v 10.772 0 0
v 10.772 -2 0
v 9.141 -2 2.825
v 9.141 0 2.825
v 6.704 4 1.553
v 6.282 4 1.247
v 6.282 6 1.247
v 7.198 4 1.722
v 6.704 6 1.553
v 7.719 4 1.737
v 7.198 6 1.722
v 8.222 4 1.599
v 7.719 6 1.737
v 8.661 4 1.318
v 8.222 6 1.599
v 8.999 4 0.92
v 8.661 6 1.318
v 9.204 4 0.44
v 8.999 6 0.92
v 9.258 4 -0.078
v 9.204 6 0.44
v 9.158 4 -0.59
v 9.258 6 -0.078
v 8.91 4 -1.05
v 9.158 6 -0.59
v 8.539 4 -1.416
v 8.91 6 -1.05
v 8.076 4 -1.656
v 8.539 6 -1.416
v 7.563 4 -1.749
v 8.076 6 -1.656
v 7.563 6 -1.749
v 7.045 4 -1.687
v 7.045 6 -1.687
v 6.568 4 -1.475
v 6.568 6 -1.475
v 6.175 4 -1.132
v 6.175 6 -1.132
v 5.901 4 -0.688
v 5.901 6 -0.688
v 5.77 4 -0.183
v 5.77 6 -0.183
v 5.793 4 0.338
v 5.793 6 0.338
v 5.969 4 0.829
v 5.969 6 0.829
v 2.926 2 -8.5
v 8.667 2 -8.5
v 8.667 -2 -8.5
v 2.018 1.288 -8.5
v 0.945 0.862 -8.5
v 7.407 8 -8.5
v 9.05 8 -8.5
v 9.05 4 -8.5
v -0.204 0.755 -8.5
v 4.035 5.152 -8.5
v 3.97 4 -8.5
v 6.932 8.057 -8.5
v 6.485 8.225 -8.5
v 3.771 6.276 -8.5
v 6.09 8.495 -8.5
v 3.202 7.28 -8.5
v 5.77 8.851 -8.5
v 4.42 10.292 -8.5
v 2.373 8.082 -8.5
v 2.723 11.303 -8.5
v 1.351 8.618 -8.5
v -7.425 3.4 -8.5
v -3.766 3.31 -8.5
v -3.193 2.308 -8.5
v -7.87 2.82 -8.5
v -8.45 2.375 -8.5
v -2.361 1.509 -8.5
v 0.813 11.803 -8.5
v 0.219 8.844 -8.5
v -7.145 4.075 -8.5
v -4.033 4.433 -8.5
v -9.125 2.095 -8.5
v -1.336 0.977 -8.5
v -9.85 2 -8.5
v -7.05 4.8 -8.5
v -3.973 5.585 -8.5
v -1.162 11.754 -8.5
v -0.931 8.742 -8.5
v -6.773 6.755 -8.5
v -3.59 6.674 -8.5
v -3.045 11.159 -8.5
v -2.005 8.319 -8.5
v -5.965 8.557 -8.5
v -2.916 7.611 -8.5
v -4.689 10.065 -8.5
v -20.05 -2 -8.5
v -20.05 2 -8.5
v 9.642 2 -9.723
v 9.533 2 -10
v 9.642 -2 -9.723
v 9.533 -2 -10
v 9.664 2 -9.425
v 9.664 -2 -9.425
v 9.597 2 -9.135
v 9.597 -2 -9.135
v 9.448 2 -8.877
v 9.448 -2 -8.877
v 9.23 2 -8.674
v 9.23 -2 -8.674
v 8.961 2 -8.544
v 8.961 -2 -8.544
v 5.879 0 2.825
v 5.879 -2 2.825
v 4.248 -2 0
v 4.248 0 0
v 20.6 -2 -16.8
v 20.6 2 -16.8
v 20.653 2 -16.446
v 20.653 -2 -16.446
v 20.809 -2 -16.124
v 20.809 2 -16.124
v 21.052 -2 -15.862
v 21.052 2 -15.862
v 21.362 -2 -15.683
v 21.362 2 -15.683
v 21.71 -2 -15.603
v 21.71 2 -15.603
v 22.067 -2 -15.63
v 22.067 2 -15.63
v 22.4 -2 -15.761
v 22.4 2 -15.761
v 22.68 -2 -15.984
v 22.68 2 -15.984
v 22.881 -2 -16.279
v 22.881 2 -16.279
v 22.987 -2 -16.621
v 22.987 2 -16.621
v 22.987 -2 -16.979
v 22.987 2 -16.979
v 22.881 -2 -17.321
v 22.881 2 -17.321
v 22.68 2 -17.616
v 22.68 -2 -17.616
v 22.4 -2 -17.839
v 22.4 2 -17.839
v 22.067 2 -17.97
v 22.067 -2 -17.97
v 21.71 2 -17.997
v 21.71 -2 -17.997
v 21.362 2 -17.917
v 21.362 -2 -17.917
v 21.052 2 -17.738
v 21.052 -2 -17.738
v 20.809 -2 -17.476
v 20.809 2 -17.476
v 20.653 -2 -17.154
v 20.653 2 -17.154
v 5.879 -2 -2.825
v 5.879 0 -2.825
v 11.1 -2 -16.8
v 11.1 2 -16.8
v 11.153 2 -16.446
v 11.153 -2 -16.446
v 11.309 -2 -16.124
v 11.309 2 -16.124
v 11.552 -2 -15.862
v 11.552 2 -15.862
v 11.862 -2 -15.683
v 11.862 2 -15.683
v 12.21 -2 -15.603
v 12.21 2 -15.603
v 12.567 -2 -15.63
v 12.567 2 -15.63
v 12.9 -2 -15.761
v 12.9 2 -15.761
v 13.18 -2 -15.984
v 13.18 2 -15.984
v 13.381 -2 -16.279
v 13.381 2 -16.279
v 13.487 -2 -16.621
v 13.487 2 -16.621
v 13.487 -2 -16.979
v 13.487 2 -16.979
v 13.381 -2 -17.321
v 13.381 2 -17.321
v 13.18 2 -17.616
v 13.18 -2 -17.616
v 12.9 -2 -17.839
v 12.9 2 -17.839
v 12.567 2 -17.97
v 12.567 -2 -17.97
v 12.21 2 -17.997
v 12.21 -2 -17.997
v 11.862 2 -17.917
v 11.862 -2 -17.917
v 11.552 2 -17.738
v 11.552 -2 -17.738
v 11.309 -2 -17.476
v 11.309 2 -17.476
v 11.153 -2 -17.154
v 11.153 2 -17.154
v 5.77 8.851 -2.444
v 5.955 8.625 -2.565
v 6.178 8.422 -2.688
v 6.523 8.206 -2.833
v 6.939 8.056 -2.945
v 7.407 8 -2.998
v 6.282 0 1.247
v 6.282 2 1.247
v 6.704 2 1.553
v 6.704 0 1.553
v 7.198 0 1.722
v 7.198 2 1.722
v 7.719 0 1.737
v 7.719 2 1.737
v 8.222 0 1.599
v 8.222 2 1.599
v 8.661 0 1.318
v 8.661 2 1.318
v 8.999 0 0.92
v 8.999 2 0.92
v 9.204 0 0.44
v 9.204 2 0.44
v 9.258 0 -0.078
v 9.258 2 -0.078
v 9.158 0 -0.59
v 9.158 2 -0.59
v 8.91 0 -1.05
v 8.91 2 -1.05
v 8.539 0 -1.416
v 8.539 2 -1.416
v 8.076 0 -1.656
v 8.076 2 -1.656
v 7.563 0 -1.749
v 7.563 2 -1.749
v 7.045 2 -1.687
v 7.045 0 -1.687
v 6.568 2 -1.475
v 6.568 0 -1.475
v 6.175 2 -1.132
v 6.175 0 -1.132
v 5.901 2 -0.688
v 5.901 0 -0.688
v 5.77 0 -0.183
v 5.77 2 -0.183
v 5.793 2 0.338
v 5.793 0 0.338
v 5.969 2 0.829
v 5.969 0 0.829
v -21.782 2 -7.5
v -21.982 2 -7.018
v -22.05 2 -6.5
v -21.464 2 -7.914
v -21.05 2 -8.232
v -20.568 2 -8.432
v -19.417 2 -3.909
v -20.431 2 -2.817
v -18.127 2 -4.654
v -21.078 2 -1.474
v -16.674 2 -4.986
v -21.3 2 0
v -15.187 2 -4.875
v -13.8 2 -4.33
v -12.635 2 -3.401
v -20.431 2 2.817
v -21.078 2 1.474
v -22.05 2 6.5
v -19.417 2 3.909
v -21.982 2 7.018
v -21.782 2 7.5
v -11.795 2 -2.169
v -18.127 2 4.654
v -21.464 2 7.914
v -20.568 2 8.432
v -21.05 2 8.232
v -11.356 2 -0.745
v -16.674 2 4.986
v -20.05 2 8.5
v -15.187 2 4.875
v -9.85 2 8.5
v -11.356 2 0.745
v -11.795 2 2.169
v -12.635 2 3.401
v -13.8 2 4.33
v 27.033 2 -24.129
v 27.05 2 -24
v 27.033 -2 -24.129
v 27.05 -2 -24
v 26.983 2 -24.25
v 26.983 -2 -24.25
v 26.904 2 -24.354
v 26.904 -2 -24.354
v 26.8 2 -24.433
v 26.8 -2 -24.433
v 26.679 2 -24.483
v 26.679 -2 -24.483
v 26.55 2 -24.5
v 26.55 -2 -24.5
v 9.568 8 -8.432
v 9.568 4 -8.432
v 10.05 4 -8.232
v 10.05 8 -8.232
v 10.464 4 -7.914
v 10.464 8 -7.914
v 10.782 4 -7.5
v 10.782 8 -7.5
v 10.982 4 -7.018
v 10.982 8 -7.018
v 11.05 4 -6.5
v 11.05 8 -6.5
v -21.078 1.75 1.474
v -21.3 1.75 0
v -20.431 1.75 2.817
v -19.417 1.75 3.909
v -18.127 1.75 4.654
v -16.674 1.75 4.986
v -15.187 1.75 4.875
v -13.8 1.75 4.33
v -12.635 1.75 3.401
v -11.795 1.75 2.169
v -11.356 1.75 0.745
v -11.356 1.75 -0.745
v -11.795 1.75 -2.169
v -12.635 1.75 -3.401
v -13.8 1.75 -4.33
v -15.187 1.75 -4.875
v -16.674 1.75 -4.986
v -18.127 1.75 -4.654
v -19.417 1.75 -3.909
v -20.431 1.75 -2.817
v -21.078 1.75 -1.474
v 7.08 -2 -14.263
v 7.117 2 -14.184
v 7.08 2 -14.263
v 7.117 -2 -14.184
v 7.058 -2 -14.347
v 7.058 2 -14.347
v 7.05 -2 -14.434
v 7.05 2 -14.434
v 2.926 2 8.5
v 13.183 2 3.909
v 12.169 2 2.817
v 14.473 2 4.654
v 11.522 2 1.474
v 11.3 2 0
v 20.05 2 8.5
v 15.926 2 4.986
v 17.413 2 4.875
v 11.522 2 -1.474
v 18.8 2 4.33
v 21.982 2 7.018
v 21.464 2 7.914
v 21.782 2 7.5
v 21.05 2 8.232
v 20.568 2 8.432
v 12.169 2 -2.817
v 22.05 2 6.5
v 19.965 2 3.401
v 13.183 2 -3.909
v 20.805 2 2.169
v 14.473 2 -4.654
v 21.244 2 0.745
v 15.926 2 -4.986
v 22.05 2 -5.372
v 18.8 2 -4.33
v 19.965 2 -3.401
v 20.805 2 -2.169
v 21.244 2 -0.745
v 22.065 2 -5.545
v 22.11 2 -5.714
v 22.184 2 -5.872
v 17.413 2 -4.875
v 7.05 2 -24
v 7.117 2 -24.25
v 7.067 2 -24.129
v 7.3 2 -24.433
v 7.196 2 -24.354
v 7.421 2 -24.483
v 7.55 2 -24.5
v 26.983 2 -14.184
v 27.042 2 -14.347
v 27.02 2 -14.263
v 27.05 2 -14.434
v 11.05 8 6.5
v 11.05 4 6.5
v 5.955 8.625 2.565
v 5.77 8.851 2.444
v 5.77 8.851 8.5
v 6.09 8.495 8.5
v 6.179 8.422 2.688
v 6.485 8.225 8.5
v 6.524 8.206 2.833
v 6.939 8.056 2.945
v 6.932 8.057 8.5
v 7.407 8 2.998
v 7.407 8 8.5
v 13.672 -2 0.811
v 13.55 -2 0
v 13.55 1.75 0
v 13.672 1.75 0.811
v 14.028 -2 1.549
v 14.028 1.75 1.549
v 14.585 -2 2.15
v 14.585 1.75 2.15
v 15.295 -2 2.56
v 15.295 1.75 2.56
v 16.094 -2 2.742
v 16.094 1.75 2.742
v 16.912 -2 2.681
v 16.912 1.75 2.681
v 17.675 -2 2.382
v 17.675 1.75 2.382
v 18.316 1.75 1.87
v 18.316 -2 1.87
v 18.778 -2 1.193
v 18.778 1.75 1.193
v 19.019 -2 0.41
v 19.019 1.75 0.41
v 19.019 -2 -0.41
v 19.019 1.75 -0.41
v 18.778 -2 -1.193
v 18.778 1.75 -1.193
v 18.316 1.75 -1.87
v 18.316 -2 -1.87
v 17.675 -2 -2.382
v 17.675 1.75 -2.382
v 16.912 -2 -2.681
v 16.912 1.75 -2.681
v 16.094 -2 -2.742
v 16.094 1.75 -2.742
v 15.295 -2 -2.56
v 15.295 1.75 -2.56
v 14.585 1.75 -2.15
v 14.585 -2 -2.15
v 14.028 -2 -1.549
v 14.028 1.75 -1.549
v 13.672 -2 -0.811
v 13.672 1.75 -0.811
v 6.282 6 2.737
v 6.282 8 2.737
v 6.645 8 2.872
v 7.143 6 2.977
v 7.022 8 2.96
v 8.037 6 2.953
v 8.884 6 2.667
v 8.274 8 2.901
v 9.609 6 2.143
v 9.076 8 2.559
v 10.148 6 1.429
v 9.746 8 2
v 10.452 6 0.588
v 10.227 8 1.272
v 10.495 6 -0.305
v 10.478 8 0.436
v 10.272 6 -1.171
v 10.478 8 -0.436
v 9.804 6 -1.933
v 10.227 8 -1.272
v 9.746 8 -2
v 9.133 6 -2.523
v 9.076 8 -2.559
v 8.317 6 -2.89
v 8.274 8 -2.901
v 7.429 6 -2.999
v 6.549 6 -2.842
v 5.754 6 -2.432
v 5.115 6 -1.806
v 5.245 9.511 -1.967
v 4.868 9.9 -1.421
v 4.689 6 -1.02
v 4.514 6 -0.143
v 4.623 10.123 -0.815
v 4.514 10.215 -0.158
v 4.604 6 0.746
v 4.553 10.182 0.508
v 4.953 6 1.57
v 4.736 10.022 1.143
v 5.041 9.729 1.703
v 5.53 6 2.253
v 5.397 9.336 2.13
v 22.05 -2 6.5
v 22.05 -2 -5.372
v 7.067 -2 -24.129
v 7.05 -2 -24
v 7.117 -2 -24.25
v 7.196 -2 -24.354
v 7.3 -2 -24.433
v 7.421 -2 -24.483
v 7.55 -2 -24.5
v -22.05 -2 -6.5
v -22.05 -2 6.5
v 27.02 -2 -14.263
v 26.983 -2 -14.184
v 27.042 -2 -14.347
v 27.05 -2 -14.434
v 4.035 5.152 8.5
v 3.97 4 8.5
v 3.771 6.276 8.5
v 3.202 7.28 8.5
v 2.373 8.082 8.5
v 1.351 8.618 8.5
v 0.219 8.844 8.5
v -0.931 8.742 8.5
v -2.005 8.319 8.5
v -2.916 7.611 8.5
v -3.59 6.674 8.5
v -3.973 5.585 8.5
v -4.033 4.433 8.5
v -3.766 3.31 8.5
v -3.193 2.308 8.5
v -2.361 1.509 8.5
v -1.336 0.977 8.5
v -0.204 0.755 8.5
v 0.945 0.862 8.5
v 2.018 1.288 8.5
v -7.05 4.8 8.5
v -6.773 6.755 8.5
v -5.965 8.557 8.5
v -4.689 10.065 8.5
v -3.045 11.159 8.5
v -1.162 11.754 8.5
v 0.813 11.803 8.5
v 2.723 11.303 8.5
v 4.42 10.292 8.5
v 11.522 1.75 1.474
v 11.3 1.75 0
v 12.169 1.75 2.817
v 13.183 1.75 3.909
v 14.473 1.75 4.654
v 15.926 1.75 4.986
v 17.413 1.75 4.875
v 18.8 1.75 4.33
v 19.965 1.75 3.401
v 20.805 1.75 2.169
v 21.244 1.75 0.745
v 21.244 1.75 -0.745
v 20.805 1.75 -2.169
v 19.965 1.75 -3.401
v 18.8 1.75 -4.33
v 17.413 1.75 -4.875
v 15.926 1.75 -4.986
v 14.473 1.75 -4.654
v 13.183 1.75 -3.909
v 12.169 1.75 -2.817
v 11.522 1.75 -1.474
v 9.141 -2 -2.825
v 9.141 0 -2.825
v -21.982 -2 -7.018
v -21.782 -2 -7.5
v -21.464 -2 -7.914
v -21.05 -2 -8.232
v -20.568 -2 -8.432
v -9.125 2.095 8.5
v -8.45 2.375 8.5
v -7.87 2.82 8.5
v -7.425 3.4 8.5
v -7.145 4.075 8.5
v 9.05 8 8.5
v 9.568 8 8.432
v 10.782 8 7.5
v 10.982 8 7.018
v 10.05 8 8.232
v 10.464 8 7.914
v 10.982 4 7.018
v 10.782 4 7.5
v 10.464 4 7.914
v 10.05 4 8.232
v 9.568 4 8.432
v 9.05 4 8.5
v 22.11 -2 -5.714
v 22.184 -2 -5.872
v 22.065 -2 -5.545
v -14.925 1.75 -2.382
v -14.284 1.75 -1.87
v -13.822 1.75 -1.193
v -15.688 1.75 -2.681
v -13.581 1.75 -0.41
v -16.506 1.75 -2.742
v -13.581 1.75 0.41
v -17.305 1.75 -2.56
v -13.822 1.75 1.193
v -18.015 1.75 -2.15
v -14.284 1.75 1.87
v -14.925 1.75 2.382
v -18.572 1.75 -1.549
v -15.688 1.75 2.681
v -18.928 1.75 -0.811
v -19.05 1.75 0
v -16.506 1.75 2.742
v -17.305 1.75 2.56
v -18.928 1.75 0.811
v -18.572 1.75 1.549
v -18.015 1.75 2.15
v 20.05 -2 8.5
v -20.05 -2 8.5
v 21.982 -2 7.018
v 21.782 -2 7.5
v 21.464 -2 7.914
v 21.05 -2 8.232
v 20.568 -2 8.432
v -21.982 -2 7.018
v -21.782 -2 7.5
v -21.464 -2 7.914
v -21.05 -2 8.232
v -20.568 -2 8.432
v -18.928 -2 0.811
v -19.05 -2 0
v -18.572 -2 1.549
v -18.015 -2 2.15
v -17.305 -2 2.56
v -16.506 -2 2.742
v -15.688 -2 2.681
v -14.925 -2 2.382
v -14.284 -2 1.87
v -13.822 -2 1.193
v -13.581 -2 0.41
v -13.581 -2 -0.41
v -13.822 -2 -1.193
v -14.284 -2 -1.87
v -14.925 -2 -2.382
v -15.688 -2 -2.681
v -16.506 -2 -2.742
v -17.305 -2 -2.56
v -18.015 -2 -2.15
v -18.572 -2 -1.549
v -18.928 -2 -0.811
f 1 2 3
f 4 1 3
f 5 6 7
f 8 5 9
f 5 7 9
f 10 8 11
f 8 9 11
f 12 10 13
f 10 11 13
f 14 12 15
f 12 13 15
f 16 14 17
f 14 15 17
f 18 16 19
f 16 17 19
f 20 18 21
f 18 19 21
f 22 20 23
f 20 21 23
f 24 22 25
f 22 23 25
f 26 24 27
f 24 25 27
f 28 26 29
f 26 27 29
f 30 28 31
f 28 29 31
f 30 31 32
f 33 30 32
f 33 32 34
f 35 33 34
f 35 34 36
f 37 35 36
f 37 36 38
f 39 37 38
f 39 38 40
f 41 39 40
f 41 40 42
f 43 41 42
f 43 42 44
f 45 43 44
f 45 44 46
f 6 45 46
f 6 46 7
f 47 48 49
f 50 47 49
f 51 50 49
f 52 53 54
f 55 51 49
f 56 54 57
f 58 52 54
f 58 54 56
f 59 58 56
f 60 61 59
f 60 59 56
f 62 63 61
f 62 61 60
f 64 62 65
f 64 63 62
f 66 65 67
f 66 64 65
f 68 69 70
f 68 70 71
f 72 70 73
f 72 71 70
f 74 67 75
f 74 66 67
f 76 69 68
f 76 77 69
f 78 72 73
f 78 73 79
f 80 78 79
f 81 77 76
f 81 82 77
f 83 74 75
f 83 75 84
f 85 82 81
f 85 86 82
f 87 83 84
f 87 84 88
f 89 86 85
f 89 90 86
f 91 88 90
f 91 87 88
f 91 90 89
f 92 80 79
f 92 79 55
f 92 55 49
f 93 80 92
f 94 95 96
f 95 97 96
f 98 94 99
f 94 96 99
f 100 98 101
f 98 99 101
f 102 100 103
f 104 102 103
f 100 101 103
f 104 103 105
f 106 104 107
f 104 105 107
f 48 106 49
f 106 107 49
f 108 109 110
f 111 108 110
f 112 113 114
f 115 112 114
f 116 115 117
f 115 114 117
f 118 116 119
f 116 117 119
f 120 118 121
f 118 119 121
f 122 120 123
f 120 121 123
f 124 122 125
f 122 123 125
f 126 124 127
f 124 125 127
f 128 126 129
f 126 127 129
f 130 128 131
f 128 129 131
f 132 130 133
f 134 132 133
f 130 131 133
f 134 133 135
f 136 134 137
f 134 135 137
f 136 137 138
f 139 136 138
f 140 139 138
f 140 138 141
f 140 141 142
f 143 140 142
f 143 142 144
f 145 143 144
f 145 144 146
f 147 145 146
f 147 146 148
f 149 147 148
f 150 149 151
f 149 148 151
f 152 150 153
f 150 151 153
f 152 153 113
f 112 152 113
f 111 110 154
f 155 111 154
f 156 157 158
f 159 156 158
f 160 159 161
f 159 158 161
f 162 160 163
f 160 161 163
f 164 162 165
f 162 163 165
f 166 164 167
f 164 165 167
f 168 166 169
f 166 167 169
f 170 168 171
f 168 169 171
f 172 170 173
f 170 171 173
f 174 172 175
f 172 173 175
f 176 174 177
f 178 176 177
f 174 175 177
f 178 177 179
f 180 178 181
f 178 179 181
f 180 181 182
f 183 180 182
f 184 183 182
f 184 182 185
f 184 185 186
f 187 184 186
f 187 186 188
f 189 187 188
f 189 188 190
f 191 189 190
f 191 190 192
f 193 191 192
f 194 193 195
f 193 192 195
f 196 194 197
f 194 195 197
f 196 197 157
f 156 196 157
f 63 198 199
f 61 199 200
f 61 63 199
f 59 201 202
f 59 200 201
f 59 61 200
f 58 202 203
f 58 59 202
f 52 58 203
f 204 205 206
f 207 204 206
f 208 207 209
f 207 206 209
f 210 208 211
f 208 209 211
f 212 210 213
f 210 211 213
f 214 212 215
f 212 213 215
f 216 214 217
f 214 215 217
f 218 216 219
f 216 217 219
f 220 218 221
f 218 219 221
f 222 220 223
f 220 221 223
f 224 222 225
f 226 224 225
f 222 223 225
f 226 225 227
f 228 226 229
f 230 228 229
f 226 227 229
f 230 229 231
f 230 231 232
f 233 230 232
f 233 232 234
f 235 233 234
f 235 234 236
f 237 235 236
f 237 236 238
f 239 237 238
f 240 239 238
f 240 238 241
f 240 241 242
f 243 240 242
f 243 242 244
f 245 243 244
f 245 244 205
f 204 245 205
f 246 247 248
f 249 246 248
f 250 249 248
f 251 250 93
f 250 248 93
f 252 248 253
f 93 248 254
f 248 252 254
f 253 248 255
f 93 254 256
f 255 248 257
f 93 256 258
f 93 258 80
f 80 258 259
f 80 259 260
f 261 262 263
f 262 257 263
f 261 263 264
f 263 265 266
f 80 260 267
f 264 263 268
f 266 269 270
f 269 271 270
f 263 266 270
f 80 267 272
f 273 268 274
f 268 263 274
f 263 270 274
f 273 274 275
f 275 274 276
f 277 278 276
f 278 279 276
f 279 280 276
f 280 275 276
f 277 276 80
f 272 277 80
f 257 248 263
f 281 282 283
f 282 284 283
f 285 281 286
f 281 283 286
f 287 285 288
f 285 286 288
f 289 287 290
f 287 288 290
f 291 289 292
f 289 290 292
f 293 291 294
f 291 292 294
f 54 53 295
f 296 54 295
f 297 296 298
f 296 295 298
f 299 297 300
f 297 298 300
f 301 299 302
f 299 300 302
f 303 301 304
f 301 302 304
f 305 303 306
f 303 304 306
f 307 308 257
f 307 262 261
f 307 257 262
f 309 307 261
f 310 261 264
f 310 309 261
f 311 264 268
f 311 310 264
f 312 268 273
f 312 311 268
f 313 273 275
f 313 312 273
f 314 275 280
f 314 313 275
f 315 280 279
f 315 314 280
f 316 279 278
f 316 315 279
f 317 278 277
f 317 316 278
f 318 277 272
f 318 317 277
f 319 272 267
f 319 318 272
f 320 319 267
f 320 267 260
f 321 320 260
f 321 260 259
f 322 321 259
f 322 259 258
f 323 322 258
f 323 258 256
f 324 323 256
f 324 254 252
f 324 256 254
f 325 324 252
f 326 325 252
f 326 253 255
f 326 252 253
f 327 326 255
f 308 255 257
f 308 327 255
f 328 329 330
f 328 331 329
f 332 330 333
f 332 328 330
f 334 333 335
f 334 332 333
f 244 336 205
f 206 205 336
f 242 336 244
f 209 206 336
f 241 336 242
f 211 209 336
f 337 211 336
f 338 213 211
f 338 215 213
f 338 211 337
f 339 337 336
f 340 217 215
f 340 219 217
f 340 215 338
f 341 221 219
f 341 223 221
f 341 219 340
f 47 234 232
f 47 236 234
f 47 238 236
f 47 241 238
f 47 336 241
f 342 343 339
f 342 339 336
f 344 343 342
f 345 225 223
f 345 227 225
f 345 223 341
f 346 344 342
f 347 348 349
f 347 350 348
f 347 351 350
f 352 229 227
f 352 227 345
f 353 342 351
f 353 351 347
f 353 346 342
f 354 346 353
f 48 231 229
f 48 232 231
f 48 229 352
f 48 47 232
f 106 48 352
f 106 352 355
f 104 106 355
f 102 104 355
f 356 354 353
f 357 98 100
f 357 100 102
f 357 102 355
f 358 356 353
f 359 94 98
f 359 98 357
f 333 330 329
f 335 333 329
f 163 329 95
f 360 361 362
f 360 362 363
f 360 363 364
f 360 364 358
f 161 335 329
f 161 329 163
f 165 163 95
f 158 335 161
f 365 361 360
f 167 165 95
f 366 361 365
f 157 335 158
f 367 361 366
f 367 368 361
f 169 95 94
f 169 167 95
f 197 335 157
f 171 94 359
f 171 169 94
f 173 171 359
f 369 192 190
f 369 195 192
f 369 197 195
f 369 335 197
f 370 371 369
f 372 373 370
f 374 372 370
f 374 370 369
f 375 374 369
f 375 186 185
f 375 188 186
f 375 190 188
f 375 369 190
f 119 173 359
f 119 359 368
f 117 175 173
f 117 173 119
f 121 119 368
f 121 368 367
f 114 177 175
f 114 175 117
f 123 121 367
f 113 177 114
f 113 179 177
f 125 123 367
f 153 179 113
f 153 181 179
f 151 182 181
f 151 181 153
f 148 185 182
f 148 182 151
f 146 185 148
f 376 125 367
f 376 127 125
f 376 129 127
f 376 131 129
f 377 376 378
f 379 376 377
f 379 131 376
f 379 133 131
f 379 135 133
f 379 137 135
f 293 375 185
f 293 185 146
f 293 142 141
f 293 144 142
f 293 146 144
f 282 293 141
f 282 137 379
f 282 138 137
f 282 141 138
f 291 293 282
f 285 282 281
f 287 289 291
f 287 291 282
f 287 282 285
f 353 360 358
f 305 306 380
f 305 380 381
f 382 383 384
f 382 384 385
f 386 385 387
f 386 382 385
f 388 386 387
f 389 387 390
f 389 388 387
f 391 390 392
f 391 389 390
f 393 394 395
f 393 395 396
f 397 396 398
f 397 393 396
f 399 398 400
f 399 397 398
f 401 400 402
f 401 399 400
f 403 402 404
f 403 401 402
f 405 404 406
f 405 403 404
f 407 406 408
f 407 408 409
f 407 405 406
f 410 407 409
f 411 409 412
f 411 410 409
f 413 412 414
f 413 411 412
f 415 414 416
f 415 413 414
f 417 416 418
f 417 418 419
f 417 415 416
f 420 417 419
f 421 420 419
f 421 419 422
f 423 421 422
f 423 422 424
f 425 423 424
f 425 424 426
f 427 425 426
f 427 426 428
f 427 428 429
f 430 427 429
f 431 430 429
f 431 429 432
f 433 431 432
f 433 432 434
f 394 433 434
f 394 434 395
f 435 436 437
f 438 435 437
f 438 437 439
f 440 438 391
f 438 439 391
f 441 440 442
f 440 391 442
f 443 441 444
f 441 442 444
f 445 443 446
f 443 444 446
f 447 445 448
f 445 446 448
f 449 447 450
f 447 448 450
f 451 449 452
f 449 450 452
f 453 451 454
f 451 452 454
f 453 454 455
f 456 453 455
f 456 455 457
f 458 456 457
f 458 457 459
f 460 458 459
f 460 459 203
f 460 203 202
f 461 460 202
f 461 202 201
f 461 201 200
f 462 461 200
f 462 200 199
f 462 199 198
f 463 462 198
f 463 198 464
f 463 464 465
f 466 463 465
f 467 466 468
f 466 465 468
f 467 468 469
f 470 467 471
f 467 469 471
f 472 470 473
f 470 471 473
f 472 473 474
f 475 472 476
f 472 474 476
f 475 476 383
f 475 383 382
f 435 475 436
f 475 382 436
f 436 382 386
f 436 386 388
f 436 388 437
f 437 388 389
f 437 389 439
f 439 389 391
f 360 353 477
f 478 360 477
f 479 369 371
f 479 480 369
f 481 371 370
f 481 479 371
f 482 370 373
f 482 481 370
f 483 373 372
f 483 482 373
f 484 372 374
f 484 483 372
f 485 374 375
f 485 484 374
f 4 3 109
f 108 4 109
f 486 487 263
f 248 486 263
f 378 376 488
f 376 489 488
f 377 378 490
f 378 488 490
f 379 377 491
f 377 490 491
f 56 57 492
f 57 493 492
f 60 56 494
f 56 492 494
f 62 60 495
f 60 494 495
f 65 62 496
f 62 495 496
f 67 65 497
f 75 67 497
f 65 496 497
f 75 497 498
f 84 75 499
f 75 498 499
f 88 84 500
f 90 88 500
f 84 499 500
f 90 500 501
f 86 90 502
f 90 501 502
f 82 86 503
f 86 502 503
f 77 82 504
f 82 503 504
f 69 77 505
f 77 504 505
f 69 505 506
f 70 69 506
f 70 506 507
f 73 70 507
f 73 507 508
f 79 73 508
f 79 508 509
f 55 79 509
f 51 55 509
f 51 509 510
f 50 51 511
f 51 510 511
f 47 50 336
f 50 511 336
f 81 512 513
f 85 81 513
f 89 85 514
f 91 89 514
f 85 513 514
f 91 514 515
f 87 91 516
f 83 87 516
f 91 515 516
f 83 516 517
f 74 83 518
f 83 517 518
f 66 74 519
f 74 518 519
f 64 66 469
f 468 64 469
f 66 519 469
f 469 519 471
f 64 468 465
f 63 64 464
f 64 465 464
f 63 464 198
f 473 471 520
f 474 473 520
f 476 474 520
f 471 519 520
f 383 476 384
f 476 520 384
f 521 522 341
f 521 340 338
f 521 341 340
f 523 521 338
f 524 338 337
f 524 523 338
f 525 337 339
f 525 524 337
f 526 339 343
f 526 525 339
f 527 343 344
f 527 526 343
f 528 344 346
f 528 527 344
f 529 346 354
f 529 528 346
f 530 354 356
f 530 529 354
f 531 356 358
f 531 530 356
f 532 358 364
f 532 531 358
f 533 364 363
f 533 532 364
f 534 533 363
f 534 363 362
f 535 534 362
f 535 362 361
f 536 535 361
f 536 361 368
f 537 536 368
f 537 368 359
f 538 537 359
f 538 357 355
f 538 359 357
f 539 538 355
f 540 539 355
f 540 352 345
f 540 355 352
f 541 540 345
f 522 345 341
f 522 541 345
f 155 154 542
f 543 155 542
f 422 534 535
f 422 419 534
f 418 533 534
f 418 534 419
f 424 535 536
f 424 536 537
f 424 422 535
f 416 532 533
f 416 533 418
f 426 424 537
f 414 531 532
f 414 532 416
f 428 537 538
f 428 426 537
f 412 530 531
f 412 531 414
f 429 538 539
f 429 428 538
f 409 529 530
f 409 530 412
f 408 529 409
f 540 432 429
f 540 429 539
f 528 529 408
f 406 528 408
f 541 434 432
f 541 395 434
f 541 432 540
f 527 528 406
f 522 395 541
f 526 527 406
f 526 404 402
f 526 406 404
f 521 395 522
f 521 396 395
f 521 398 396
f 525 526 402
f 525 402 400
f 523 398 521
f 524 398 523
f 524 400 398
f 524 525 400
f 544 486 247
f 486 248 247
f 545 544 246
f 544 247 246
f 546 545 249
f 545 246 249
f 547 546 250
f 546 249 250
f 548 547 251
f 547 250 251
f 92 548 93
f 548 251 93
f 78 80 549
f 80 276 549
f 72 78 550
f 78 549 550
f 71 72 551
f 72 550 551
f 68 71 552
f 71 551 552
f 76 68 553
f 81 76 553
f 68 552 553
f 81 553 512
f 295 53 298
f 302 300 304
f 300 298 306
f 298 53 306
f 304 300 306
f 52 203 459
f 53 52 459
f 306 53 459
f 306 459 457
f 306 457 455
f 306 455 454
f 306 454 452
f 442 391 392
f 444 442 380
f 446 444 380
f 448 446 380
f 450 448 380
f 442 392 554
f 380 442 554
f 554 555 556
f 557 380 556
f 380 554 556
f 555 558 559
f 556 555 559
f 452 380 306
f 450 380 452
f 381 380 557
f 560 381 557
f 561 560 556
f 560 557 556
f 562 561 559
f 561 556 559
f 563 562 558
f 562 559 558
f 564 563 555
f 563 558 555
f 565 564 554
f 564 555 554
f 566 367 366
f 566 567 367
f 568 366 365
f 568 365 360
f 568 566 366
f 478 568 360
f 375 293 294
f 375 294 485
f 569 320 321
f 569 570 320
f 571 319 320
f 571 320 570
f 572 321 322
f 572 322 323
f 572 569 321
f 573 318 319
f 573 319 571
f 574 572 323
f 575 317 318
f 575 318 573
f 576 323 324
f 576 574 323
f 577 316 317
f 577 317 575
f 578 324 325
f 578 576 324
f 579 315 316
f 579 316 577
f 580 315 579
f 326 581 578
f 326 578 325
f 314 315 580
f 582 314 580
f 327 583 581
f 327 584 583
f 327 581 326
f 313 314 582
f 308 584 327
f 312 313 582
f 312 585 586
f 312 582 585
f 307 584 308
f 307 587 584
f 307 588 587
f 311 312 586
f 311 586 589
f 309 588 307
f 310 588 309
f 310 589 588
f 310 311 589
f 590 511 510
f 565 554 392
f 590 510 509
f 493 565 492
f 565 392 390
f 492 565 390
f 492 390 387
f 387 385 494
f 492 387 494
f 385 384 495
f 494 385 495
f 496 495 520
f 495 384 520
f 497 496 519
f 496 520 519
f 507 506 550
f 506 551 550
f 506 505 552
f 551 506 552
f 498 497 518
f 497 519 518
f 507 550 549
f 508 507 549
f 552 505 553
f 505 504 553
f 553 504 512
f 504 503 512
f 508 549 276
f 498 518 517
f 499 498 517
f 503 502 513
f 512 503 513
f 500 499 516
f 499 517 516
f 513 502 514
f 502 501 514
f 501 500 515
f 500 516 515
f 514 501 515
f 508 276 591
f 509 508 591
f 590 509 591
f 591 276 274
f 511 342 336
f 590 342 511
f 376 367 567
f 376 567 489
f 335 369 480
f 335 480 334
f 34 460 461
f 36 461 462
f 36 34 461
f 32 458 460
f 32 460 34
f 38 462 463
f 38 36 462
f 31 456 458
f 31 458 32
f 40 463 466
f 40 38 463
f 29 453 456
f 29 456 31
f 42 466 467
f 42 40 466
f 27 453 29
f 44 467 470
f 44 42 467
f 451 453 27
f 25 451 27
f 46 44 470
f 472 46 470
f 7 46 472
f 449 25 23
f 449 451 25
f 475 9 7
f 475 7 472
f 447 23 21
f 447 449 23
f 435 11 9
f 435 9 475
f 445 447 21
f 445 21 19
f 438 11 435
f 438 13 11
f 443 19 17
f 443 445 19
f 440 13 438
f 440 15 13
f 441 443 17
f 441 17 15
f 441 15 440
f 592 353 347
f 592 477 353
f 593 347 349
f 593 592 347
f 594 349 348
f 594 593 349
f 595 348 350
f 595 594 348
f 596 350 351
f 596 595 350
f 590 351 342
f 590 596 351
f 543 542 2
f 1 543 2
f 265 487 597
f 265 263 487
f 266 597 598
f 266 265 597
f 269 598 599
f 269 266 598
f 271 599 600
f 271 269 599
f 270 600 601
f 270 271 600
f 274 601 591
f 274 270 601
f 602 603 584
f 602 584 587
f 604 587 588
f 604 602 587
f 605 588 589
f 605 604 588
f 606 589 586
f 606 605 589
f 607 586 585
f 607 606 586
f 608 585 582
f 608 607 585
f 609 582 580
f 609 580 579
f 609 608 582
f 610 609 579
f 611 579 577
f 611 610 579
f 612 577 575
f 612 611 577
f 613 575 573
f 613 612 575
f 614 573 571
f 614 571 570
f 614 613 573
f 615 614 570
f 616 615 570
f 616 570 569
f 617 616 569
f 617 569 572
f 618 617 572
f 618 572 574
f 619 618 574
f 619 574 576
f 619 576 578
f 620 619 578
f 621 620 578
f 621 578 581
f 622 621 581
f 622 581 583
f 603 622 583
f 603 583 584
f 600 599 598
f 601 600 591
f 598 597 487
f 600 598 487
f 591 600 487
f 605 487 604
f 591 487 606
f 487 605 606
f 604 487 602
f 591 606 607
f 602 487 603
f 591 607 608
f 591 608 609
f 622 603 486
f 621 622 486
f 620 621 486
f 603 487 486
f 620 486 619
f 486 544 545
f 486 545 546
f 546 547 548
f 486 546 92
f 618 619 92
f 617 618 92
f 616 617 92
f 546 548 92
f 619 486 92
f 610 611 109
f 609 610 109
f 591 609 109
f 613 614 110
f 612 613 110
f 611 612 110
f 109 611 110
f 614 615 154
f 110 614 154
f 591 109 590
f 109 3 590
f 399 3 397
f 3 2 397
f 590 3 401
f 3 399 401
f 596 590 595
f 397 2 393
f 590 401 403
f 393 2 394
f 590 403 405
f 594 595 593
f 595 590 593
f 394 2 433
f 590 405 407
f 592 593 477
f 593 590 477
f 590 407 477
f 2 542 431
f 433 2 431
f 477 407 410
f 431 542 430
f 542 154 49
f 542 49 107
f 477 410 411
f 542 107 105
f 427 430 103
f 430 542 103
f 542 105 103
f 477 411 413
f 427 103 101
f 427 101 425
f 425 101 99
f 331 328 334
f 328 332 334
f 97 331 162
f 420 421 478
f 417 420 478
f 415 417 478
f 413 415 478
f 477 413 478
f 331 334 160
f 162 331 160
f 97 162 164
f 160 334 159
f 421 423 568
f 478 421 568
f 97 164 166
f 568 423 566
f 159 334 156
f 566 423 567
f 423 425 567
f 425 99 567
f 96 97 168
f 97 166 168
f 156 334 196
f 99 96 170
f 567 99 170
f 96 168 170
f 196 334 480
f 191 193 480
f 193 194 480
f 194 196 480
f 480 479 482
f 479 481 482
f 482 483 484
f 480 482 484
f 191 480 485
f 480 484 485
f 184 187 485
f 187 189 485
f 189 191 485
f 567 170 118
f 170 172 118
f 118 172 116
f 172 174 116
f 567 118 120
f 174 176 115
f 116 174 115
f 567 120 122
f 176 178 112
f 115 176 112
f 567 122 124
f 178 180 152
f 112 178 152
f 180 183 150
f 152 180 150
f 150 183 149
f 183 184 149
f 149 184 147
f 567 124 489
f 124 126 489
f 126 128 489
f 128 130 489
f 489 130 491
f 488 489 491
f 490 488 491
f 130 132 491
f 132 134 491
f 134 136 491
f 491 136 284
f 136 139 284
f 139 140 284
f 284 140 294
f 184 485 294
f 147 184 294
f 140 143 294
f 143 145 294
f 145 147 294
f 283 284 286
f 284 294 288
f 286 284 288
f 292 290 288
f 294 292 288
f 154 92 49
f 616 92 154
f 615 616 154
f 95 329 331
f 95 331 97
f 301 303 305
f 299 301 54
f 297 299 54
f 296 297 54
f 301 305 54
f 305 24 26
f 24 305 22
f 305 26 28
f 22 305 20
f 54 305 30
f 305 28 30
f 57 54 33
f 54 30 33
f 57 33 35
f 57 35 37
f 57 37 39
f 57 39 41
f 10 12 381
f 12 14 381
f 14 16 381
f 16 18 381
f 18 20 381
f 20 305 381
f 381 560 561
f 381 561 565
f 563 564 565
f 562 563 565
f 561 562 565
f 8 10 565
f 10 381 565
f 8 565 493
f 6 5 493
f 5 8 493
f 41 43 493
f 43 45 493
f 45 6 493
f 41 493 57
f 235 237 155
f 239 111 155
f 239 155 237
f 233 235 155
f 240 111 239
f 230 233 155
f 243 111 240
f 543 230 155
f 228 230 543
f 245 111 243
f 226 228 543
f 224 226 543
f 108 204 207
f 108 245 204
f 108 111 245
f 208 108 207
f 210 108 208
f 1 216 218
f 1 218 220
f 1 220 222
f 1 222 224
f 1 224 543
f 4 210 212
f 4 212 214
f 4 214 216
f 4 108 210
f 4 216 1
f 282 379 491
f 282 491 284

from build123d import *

# Parameters (mm, degrees)
BOSS_EXTRUDE1_DEPTH     = 8.5
CUT_EXTRUDE1_DEPTH      = 2
CUT_EXTRUDE1_DEPTH_BACK = 26.602245995
SKETCH2_R               = 2.75
CUT_EXTRUDE2_DEPTH      = 2
CUT_EXTRUDE2_DEPTH_BACK = 0.25
SKETCH2_3_R             = 5
SKETCH2_3_R_2           = 2.75
SKETCH3_R               = 1.75
CUT_EXTRUDE3_DEPTH      = 28.391148205
SKETCH3_3_R             = 3
SKETCH3_3_R_2           = 1.75
CUT_EXTRUDE4_DEPTH      = 5.85
FILLET1_R               = 2
FILLET2_R               = 2
CUT_EXTRUDE5_DEPTH      = 2
SKETCH5_R               = 1.2
BOSS_EXTRUDE2_DEPTH     = 4
FILLET3_R               = 1
FILLET4_R               = 0.5


with BuildPart() as part:
    # Sketch1 → Boss-Extrude1 (new, symmetric)
    with BuildSketch(Plane.XY):
        with BuildLine():
            Line((11.05, 4), (3.970201506, 4))
            ThreePointArc((3.970201506, 4), (-3.590264914, 6.674165907), (2.926174978, 2))
            Line((2.926174978, 2), (22.05, 2))
            Line((22.05, 2), (22.05, -2))
            Line((22.05, -2), (-22.05, -2))
            Line((-22.05, -2), (-22.05, 2))
            Line((-22.05, 2), (-9.85, 2))
            ThreePointArc((-9.85, 2), (-7.870101013, 2.820101013), (-7.05, 4.8))
            ThreePointArc((-7.05, 4.8), (-1.645444408, 11.655290855), (6.281918497, 8))
            Line((6.281918497, 8), (11.05, 8))
            Line((11.05, 8), (11.05, 4))
        make_face()
    extrude(amount=BOSS_EXTRUDE1_DEPTH, both=True)

    # Sketch2 → Cut-Extrude1 (cut, two sides: drawn at the far end of the back side and taken through both)
    with BuildSketch(Plane(origin=(0, 2, 0), x_dir=(1, 0, 0), z_dir=(0, 1, 0)).offset(-CUT_EXTRUDE1_DEPTH_BACK)):
        with Locations(Location((16.3, 0, 0), (0, 0, 180))):
            Circle(SKETCH2_R)
        with Locations(Location((-16.3, 0, 0), (0, 0, 180))):
            Circle(SKETCH2_R)
    extrude(amount=CUT_EXTRUDE1_DEPTH + CUT_EXTRUDE1_DEPTH_BACK, mode=Mode.SUBTRACT)

    # Sketch2<3> → Cut-Extrude2 (cut, two sides: drawn at the far end of the back side and taken through both)
    # profile 1 of 2: a face of its own
    with BuildSketch(Plane(origin=(0, 2, 0), x_dir=(1, 0, 0), z_dir=(0, 1, 0)).offset(-CUT_EXTRUDE2_DEPTH_BACK)):
        with Locations(Location((16.3, 0, 0), (0, 0, 180))):
            Circle(SKETCH2_3_R)
        with Locations(Location((16.3, 0, 0), (0, 0, 180))):
            Circle(SKETCH2_3_R_2, mode=Mode.SUBTRACT)
    # profile 2 of 2: a face of its own
    with BuildSketch(Plane(origin=(0, 2, 0), x_dir=(1, 0, 0), z_dir=(0, 1, 0)).offset(-CUT_EXTRUDE2_DEPTH_BACK)):
        with Locations(Location((-16.3, 0, 0), (0, 0, 180))):
            Circle(SKETCH2_3_R)
        with Locations(Location((-16.3, 0, 0), (0, 0, 180))):
            Circle(SKETCH2_3_R_2, mode=Mode.SUBTRACT)
    extrude(amount=CUT_EXTRUDE2_DEPTH + CUT_EXTRUDE2_DEPTH_BACK, mode=Mode.SUBTRACT)

    # Sketch3 → Cut-Extrude3 (cut, through all)
    with BuildSketch(Plane(origin=(0, 11.85, 0), x_dir=(1, 0, 0), z_dir=(0, 1, 0))):
        with Locations(Location((7.510100753, 0, 0), (0, 0, 225.426920251))):
            Circle(SKETCH3_R)
    extrude(amount=-CUT_EXTRUDE3_DEPTH, mode=Mode.SUBTRACT)

    # Sketch3<3> → Cut-Extrude4 (cut)
    # profile 1 of 2: a face of its own
    with BuildSketch(Plane(origin=(0, 11.85, 0), x_dir=(1, 0, 0), z_dir=(0, 1, 0))):
        with Locations(Location((7.510100753, 0, 0), (0, 0, 245.83322212))):
            Circle(SKETCH3_3_R)
        with Locations(Location((7.510100753, 0, 0), (0, 0, 180))):
            Circle(SKETCH3_3_R_2, mode=Mode.SUBTRACT)
    # profile 2 of 2: a face of its own
    with BuildSketch(Plane(origin=(0, 11.85, 0), x_dir=(1, 0, 0), z_dir=(0, 1, 0))):
        with Locations(Location((7.510100753, 0, 0), (0, 0, 180))):
            Circle(SKETCH3_3_R_2)
    extrude(amount=-CUT_EXTRUDE4_DEPTH, mode=Mode.SUBTRACT)

    # Fillet1
    fillet1_edges = [part.edges().sort_by_distance(p)[0] for p in [
        (22.05, 0, 8.5),
        (-22.05, 0, -8.5),
        (-22.05, 0, 8.5),
    ]]
    fillet(fillet1_edges, radius=FILLET1_R)

    # Fillet2
    # the kernel refuses this fillet: 2 mm, written as the material it adds along each edge
    with BuildSketch(Plane(origin=(6.281918497, 8, -0.075436901), x_dir=(1, 0, 0), z_dir=(0, 0, 1))) as fillet2_piece_1_section:
        with BuildLine():
            CenterArc((1.125003941, 2), FILLET2_R, 215.07061915, 54.92938085)
            ThreePointArc((-0.511884995, 0.850828729), (-0.240944724, 0.434437491), (0, 0))
            Line((0, 0), (1.125003941, 0))
        make_face()
    fillet2_piece_1 = extrude(amount=8.575436901, mode=Mode.PRIVATE)
    fillet2_piece_1 = fillet2_piece_1 - Plane(origin=(7.510100753, 8.184515376, 0), x_dir=(-0.4093940854484991, 0, 0.9123576507049125), z_dir=(0, 1, 0)) * Cylinder(3, 22, mode=Mode.PRIVATE)
    add(fillet2_piece_1)
    with BuildSketch(Plane(origin=(6.281918497, 8, -8.5), x_dir=(1, 0, 0), z_dir=(0, 0, 1))) as fillet2_piece_2_section:
        with BuildLine():
            CenterArc((1.125003941, 2), FILLET2_R, 215.07061915, 54.92938085)
            ThreePointArc((-0.511884995, 0.850828729), (-0.240944724, 0.434437491), (0, 0))
            Line((0, 0), (1.125003941, 0))
        make_face()
    fillet2_piece_2 = extrude(amount=8.575436901, mode=Mode.PRIVATE)
    fillet2_piece_2 = fillet2_piece_2 - Plane(origin=(7.510100753, 8.184515325, 0), x_dir=(-0.4093940854484991, 0, 0.9123576507049125), z_dir=(0, 1, 0)) * Cylinder(3, 22, mode=Mode.PRIVATE)
    add(fillet2_piece_2)
    # the kernel refuses this fillet: 2 mm, written as the material it takes off along each edge
    with BuildSketch(Plane(origin=(11.05, 13, -8.5), x_dir=(-1, 0, 0), z_dir=(0, -1, 0))) as fillet2_2_piece_1_section:
        with BuildLine():
            CenterArc((FILLET2_R, -FILLET2_R), FILLET2_R, 90, 90)
            Line((0, -FILLET2_R), (0, 0))
            Line((0, 0), (FILLET2_R, 0))
        make_face()
    fillet2_2_piece_1 = extrude(amount=14, mode=Mode.PRIVATE)
    fillet2_2_piece_1 = split(fillet2_2_piece_1, bisect_by=Plane(origin=(10.603264122, 2, -8.053264122), z_dir=(0, 1, 0)), keep=Keep.TOP, mode=Mode.PRIVATE)
    add(fillet2_2_piece_1, mode=Mode.SUBTRACT)
    with BuildSketch(Plane(origin=(11.05, 13, 8.5), x_dir=(-1, 0, 0), z_dir=(0, -1, 0))) as fillet2_2_piece_2_section:
        with BuildLine():
            CenterArc((FILLET2_R, FILLET2_R), FILLET2_R, 180, 90)
            Line((0, FILLET2_R), (0, 0))
            Line((0, 0), (FILLET2_R, 0))
        make_face()
    fillet2_2_piece_2 = extrude(amount=14, mode=Mode.PRIVATE)
    fillet2_2_piece_2 = split(fillet2_2_piece_2, bisect_by=Plane(origin=(10.603264122, 2, 8.053264122), z_dir=(0, 1, 0)), keep=Keep.TOP, mode=Mode.PRIVATE)
    add(fillet2_2_piece_2, mode=Mode.SUBTRACT)

    # Sketch4 → Cut-Extrude5 (cut)
    with BuildSketch(Plane.XZ.offset(2)):
        Polygon((10.772129774, 0), (9.141115264, 2.825), (5.879086243, 2.825), (4.248071732, 0), (5.879086243, -2.825), (9.141115264, -2.825), align=None)
    extrude(amount=-CUT_EXTRUDE5_DEPTH, mode=Mode.SUBTRACT)

    # Sketch5 → Boss-Extrude2 (add)
    with BuildSketch(Plane(origin=(0, 2, 0), x_dir=(1, 0, 0), z_dir=(0, 1, 0))):
        Polygon((27.05, 14.3), (27.05, 24.5), (7.05, 24.5), (7.05, 14.3), (10.398631561, 8.5), (22.05, 8.5), (22.05, 5.639745962), align=None)
        with Locations(Location((21.8, 16.8, 0), (0, 0, 180))):
            Circle(SKETCH5_R, mode=Mode.SUBTRACT)
        with Locations(Location((12.3, 16.8, 0), (0, 0, 180))):
            Circle(SKETCH5_R, mode=Mode.SUBTRACT)
    extrude(amount=-BOSS_EXTRUDE2_DEPTH)

    # Fillet3
    fillet3_edges = [part.edges().sort_by_distance(p)[0] for p in [
        (10.398631561, 0, -8.5),
        (22.05, 0, -5.639745962),
    ]]
    fillet(fillet3_edges, radius=FILLET3_R)

    # Fillet4
    fillet4_edges = [part.edges().sort_by_distance(p)[0] for p in [
        (27.05, 0, -24.5),
        (7.05, 0, -24.5),
        (7.05, 0, -14.3),
        (27.05, 0, -14.3),
    ]]
    fillet(fillet4_edges, radius=FILLET4_R)


solid = part.part
